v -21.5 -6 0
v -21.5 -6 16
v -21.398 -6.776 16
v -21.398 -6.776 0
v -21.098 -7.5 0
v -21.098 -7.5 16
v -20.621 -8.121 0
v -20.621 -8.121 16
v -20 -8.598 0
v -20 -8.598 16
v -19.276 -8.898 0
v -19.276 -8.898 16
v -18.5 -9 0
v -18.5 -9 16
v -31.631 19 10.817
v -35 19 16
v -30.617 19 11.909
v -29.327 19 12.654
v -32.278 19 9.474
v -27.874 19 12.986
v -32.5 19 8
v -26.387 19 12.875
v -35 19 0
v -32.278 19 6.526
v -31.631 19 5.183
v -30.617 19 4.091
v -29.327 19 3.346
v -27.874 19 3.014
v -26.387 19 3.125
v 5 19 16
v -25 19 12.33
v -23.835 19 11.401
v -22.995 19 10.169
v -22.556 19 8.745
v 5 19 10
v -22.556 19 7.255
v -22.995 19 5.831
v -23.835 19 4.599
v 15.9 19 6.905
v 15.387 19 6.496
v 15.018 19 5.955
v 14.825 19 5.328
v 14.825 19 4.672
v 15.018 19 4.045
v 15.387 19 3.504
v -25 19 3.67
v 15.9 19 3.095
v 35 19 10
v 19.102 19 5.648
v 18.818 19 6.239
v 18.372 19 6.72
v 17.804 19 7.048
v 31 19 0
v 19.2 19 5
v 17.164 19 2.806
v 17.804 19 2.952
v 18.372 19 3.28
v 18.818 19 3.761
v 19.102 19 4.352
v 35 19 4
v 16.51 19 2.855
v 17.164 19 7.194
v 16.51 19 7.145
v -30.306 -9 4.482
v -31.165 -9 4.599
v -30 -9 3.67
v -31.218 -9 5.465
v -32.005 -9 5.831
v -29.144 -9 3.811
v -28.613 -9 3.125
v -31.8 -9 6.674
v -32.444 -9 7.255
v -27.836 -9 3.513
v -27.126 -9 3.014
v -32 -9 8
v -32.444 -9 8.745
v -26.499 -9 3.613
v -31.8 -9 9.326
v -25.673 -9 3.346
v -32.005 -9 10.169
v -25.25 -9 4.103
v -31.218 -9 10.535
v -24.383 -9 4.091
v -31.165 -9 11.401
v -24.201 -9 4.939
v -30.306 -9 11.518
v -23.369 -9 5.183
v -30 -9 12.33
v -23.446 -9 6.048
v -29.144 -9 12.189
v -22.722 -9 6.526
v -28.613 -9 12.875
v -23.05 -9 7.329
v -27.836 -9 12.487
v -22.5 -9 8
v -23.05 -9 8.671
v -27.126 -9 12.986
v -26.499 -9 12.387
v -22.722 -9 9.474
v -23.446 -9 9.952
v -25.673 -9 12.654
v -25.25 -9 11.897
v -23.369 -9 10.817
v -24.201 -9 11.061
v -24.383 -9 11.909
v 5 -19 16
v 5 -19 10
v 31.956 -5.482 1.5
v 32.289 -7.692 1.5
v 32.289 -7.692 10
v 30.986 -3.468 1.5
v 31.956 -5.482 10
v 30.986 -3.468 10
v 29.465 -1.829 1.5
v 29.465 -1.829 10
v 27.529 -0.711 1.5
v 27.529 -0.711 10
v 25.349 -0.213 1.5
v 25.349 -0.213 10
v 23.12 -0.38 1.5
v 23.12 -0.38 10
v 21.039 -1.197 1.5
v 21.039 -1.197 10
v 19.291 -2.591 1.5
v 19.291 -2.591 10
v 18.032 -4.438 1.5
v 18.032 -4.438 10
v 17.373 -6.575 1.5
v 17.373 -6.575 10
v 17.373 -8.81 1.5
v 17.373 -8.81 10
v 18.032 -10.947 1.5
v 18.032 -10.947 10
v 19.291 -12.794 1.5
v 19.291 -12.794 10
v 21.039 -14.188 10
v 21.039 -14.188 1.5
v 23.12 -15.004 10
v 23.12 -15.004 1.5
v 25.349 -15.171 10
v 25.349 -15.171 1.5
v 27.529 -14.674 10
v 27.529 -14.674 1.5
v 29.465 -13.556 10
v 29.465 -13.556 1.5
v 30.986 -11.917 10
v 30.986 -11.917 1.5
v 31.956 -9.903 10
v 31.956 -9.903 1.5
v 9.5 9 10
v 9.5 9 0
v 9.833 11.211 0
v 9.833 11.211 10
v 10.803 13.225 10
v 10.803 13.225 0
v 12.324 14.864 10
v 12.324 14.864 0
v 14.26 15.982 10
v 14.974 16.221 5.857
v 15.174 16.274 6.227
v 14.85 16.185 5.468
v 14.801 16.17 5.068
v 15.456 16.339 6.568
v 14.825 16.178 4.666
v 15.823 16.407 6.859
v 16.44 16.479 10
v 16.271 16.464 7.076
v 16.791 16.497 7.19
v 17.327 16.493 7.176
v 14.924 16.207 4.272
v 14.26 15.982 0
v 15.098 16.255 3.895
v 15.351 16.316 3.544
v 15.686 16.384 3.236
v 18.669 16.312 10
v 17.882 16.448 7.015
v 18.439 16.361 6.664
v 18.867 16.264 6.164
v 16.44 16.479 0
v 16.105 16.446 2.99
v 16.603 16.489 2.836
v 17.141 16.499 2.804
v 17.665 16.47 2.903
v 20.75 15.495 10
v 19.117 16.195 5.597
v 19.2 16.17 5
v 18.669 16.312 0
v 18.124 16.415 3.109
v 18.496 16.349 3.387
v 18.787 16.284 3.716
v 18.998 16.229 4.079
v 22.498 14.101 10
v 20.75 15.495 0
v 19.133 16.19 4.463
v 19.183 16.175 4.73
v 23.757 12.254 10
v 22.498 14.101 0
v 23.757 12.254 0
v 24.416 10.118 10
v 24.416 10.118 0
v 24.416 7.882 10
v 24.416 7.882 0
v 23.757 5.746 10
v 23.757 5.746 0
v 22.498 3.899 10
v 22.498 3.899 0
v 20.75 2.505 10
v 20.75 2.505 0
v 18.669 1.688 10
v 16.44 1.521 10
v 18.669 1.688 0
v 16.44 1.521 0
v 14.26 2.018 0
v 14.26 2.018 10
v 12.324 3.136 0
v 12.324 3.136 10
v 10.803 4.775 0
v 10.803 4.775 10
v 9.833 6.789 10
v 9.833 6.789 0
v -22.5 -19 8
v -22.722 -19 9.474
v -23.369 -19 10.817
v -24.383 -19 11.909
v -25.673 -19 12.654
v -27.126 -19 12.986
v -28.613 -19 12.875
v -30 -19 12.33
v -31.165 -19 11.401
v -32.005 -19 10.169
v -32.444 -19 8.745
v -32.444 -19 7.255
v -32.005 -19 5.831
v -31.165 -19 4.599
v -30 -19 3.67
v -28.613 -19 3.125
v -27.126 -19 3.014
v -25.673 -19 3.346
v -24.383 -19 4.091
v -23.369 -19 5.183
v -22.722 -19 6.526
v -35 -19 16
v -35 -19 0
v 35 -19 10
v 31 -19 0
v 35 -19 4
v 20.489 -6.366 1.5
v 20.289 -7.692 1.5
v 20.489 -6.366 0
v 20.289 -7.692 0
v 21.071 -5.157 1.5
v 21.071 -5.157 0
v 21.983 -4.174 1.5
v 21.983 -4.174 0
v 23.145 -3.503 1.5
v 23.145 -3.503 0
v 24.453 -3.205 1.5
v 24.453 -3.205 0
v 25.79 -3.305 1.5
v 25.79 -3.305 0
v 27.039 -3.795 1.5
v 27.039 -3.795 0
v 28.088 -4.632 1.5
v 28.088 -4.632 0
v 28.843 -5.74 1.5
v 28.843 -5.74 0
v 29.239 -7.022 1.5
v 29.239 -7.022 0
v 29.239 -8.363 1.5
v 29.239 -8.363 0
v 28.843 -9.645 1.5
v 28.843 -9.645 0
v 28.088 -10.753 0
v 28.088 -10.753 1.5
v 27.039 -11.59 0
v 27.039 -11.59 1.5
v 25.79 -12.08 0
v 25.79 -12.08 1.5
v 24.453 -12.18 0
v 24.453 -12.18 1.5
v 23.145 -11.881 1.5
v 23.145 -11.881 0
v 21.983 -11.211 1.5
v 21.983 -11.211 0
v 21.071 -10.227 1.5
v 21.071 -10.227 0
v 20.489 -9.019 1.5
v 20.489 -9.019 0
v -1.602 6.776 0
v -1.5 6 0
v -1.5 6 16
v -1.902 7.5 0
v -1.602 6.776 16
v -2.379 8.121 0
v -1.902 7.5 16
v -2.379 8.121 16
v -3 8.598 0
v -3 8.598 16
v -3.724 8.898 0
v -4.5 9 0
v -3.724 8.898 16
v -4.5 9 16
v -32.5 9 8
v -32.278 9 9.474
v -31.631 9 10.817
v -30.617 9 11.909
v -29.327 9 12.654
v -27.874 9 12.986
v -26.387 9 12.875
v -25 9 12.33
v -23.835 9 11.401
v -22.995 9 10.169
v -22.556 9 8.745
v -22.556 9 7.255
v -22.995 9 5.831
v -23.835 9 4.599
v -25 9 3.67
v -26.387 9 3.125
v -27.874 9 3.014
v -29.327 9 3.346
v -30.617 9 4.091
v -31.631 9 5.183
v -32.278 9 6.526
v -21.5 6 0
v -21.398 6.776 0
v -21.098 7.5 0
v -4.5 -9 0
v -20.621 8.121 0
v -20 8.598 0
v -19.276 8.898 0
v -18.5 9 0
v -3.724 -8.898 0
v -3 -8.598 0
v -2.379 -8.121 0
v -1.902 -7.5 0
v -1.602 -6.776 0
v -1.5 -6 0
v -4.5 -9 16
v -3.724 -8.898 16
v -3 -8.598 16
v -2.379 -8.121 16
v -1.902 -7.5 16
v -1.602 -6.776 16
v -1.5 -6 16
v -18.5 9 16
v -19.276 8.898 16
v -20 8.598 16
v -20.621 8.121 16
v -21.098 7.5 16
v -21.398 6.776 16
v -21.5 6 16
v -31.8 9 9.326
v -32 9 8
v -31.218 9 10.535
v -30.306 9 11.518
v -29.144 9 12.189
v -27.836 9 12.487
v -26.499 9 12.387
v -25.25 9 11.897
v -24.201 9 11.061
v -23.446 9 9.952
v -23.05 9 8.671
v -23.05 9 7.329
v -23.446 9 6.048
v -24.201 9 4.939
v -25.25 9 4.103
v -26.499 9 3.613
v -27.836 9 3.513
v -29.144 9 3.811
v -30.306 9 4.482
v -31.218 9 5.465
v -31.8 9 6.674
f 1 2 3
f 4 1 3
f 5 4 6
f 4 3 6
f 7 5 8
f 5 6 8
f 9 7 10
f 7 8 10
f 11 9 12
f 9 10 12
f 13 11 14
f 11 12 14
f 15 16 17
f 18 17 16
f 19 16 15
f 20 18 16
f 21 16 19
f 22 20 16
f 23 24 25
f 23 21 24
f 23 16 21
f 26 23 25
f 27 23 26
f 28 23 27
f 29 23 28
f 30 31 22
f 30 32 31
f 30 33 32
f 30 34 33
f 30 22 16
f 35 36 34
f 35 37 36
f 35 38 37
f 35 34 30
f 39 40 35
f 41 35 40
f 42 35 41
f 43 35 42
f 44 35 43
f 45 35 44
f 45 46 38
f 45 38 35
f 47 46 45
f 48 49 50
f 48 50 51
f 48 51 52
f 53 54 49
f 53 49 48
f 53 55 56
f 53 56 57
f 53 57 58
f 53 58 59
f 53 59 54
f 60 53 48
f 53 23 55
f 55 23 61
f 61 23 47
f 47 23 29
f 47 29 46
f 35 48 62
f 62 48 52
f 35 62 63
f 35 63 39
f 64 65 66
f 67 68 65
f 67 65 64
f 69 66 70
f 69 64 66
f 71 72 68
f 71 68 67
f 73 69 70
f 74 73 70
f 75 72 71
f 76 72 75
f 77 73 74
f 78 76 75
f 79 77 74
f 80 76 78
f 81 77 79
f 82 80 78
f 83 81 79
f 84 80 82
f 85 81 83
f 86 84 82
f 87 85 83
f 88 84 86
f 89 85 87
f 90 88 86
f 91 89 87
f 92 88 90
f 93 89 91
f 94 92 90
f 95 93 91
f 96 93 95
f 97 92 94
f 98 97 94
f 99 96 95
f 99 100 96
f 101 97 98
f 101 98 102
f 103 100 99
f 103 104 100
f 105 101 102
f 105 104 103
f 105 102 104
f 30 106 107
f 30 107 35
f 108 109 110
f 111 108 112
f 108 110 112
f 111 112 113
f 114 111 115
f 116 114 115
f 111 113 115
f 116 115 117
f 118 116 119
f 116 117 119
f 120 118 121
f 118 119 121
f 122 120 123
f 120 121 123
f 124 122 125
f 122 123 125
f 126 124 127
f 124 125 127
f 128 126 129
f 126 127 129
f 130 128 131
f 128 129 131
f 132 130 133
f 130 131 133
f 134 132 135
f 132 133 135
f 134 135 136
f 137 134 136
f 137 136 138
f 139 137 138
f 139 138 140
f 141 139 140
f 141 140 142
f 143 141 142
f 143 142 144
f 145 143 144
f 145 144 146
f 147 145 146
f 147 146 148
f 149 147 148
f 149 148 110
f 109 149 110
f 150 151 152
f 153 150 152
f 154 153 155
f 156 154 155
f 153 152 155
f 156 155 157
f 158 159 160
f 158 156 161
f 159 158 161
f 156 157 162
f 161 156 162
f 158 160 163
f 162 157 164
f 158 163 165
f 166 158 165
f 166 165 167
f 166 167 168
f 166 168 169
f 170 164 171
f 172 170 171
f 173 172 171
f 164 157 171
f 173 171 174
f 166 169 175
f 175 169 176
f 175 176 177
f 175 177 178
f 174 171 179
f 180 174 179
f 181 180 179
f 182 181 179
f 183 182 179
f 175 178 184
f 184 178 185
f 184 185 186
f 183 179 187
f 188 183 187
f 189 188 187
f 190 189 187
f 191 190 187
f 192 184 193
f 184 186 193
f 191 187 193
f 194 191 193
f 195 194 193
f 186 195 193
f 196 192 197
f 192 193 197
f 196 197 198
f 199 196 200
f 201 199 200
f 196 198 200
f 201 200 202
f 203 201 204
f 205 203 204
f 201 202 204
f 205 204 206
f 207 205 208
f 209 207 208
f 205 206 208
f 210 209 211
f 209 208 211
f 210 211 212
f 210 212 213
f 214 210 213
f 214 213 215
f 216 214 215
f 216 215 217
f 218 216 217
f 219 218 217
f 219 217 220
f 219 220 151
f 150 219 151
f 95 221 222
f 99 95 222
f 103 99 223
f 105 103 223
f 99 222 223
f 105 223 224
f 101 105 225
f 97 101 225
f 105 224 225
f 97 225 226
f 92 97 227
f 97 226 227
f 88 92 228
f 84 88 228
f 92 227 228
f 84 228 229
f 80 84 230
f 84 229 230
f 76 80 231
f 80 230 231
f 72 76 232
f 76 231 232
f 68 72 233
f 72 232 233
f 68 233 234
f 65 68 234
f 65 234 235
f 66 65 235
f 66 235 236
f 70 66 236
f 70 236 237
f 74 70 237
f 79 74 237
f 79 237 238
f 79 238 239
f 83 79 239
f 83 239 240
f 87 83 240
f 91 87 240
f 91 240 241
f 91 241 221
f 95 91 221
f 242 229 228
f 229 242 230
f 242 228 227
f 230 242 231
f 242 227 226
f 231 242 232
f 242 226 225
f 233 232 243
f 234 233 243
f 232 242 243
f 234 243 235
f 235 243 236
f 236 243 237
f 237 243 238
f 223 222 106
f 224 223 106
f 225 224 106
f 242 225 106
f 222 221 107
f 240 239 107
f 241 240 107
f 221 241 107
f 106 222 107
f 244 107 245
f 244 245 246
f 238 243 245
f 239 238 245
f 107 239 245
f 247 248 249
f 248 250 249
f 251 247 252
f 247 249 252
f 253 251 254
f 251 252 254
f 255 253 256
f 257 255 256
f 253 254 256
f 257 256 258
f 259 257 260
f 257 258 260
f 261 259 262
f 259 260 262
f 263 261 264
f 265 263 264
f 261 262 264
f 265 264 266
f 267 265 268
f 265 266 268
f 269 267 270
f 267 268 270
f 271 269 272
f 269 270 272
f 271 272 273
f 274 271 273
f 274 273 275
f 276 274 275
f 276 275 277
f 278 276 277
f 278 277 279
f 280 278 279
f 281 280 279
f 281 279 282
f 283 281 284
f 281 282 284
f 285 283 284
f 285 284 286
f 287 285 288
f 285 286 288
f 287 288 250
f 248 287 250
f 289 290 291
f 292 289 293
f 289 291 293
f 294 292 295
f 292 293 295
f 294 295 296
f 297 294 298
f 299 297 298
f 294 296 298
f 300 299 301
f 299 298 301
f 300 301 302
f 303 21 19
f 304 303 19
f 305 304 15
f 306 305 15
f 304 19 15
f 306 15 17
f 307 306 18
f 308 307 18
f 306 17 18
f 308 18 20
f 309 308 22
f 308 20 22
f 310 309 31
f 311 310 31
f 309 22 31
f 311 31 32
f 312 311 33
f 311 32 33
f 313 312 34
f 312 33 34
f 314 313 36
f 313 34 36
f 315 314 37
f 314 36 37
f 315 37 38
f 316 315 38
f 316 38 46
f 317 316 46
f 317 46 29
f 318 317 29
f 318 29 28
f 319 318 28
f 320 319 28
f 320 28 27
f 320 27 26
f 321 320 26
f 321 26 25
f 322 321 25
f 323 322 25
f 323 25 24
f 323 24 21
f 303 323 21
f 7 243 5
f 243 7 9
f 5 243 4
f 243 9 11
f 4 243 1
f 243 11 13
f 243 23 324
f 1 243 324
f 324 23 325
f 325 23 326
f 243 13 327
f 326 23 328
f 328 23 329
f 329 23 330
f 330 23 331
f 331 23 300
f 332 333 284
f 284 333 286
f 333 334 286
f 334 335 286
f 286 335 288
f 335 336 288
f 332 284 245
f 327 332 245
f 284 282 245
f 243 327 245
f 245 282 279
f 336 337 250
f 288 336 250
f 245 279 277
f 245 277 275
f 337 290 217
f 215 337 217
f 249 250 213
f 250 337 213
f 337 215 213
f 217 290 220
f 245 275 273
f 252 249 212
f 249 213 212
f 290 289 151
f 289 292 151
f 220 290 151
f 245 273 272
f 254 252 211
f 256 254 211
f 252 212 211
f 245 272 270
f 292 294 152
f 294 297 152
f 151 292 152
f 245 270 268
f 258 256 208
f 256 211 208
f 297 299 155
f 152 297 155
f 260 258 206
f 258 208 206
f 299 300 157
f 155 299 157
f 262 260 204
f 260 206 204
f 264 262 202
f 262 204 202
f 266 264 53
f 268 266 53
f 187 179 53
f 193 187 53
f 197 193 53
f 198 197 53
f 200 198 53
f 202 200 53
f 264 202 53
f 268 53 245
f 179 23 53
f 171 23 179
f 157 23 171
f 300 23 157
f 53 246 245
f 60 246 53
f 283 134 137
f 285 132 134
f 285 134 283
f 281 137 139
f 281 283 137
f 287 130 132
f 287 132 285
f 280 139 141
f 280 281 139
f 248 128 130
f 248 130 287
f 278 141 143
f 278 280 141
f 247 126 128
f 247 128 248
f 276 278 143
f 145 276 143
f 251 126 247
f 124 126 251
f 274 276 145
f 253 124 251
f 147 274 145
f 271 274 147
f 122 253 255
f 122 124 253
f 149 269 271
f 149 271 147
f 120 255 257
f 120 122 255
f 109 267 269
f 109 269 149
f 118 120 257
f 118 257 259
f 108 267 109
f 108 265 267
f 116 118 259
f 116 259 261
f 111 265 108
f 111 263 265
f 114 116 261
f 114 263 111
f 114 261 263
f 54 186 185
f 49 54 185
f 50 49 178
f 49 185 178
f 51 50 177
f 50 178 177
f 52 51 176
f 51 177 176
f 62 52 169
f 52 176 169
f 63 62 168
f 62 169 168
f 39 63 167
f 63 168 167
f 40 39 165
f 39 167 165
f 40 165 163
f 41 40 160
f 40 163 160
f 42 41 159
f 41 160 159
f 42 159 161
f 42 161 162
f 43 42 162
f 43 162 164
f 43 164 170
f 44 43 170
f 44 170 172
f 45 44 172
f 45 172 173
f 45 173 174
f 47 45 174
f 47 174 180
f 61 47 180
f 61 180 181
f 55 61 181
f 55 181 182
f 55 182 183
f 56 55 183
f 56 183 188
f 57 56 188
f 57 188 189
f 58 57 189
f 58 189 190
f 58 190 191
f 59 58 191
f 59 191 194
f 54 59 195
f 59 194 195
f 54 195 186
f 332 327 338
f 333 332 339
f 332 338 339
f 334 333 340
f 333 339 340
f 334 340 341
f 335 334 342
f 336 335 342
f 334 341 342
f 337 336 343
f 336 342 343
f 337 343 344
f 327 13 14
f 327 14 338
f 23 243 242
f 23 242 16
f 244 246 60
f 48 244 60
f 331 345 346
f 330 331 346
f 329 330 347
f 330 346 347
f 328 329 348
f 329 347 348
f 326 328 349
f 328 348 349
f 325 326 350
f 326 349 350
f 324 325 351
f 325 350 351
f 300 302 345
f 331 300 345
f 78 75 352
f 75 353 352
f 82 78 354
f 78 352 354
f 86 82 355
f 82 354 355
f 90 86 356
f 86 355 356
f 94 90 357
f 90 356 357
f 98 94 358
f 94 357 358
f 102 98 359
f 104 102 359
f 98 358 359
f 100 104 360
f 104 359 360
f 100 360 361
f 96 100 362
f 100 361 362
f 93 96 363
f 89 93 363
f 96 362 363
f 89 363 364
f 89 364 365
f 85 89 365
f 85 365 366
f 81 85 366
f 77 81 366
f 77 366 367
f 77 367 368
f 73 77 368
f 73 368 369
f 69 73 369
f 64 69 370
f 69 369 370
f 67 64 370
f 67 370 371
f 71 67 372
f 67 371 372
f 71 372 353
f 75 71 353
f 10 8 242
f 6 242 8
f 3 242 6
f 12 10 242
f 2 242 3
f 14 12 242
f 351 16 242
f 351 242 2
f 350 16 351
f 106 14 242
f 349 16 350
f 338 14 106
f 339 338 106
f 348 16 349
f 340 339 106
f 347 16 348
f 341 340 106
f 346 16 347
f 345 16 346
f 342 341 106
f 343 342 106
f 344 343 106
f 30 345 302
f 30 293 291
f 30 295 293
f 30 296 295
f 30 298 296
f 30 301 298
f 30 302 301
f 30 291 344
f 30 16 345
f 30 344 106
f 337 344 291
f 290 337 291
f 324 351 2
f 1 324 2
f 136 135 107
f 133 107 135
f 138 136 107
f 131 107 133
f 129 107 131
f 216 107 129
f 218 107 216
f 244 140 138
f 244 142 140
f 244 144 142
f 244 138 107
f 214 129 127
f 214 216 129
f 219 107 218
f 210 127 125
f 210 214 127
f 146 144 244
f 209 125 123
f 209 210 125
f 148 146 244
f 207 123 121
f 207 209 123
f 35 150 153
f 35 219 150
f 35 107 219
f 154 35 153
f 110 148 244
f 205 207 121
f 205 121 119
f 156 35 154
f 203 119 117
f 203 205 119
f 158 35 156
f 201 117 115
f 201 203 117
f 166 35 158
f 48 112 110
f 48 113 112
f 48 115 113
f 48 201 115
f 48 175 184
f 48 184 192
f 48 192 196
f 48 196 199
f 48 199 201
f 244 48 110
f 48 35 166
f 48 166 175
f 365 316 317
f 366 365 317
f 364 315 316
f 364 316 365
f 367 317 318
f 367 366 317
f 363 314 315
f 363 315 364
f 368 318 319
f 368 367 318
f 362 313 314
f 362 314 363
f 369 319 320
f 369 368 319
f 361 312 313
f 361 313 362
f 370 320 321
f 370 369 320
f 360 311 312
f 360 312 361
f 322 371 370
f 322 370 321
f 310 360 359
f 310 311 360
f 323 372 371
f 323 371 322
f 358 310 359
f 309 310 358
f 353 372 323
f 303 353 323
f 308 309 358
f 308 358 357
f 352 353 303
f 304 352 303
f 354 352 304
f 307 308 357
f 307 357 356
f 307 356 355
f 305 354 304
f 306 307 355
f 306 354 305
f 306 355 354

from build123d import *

# Parameters (mm, degrees)
F0_W            = 70
F0_H            = 38
F1_DEPTH        = 16
F3_D            = 9
F3_DEPTH        = 28
F3_CBORE_D      = 10
F3_CBORE_DEPTH  = 10
F3_TIP          = 2.7038727856
F5_D            = 9
F5_DEPTH        = 28
F5_CBORE_D      = 10
F5_CBORE_DEPTH  = 10
F5_TIP          = 2.7038727856
F7_DEPTH        = 25
F8_W            = 30
F8_H            = 38
F9_DEPTH        = 6
F10_SIZE        = 4
F12_D           = 9
F12_DEPTH       = 28
F12_CBORE_D     = 15
F12_CBORE_DEPTH = 8.5
F12_TIP         = 2.7038727856
F14_D           = 15
F14_DEPTH       = 28
F14_TIP         = 4.5064546427
F16_D           = 4.4
F16_DEPTH       = 10
F16_TIP         = 1.3218933619


with BuildPart() as f1:
    # F0 (on Top) → F1 (new body)
    with BuildSketch(Plane.XY):
        Rectangle(F0_W, F0_H)
    extrude(amount=F1_DEPTH)

    # F3
    with Locations(Plane.XZ.offset(19)):
        with Locations((-27.5, 8)):
            CounterBoreHole(F3_D / 2, F3_CBORE_D / 2, F3_CBORE_DEPTH, depth=F3_DEPTH)
            with Locations((0, 0, -(F3_DEPTH + F3_TIP / 2))):  # 118° drill point
                Cone(0, F3_D / 2, F3_TIP, mode=Mode.SUBTRACT)

    # F5
    with Locations(Plane(origin=(0, 19, 0), x_dir=(-1, 0, 0), z_dir=(0, 1, 0))):
        with Locations((27.5, 8)):
            CounterBoreHole(F5_D / 2, F5_CBORE_D / 2, F5_CBORE_DEPTH, depth=F5_DEPTH)
            with Locations((0, 0, -(F5_DEPTH + F5_TIP / 2))):  # 118° drill point
                Cone(0, F5_D / 2, F5_TIP, mode=Mode.SUBTRACT)

    # F6 (on face) → F7 (cut)
    with BuildSketch(Plane.XY.offset(16)):
        with BuildLine():
            Line((-4.5, 9), (-18.5, 9))
            ThreePointArc((-18.5, 9), (-20.6213203436, 8.1213203436), (-21.5, 6))
            Line((-21.5, 6), (-21.5, -6))
            ThreePointArc((-21.5, -6), (-20.6213203436, -8.1213203436), (-18.5, -9))
            Line((-18.5, -9), (-4.5, -9))
            ThreePointArc((-4.5, -9), (-2.3786796564, -8.1213203436), (-1.5, -6))
            Line((-1.5, -6), (-1.5, 6))
            ThreePointArc((-1.5, 6), (-2.3786796564, 8.1213203436), (-4.5, 9))
        make_face()
    extrude(amount=-F7_DEPTH, mode=Mode.SUBTRACT)

    # F8 (on face) → F9 (cut)
    with BuildSketch(Plane.XY.offset(16)):
        with Locations((20, 0)):
            Rectangle(F8_W, F8_H)
    extrude(amount=-F9_DEPTH, mode=Mode.SUBTRACT)

    # F10
    f10_edges = [f1.edges().sort_by_distance(p)[0] for p in [
        (35, 0, 0),
    ]]
    chamfer(f10_edges, length=F10_SIZE)

    # F12
    with Locations(Plane.XY.offset(10)):
        with Locations((24.789, -7.6924054883)):
            CounterBoreHole(F12_D / 2, F12_CBORE_D / 2, F12_CBORE_DEPTH, depth=F12_DEPTH)
            with Locations((0, 0, -(F12_DEPTH + F12_TIP / 2))):  # 118° drill point
                Cone(0, F12_D / 2, F12_TIP, mode=Mode.SUBTRACT)

    # F14
    with Locations(Plane.XY.offset(10)):
        with Locations((17, 9)):
            Hole(F14_D / 2, depth=F14_DEPTH)
            with Locations((0, 0, -(F14_DEPTH + F14_TIP / 2))):  # 118° drill point
                Cone(0, F14_D / 2, F14_TIP, mode=Mode.SUBTRACT)

    # F16
    with Locations(Plane(origin=(0, 19, 0), x_dir=(-1, 0, 0), z_dir=(0, 1, 0))):
        with Locations((-17, 5)):
            Hole(F16_D / 2, depth=F16_DEPTH)
            with Locations((0, 0, -(F16_DEPTH + F16_TIP / 2))):  # 118° drill point
                Cone(0, F16_D / 2, F16_TIP, mode=Mode.SUBTRACT)


solid = f1.part
